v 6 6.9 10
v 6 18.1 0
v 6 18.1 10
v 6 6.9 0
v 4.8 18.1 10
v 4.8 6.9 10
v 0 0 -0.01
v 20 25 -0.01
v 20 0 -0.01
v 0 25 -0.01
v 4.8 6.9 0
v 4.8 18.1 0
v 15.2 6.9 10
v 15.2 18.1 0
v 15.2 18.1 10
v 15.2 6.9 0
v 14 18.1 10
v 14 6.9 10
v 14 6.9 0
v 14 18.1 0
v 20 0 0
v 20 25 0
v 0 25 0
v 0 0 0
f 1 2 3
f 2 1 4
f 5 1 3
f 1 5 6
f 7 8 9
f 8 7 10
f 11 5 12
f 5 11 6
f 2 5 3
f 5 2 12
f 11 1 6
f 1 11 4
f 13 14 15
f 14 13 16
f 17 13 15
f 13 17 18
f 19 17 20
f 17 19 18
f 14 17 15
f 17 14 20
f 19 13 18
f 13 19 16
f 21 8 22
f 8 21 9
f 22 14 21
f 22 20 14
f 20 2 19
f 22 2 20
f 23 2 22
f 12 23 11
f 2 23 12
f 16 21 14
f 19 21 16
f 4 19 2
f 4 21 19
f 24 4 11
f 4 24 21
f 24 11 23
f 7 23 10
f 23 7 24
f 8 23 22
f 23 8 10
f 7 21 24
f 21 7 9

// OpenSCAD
// file: ../Base/PlacementOptions.scad
// Fischertechnik Box Foundation
// Placement Options

// Alignment
NoAlign = 0;
AlignLeft = 1;
AlignBottom = 2;
AlignCenter = 3;
AlignRight = 4;
AlignTop = 5;

// Element rotation degree steps
rotations = [0, -90, -180, -270];

// Rotation
NoRotation = 0;
Rotate0 = 0;
Rotate90 = 1;
Rotate180 = 2;
Rotate270 = 3;

// Docking (seen from above)
NoDock = -1;
DockLeft = 0;
DockTop = 1;
DockRight = 2;
DockCorner = 2;
DockBottom = 3;

// Web corners
LowerLeft = 0;
UpperLeft = 1;
UpperRight = 2;
LowerRight = 3;

// Web position relative to corner
LeftOfCorner = 0;
RightOfCorner = 1;
// file: ../Base/Boxes.scad
// Fischertechnik Box Foundation
// Pre-designed Boxes

use <Constants.scad>

include <PlacementOptions.scad>

box190Width = 190;
box190Depth = 130;
box130Width = 130;
box130Depth = 95;
boxUsageHeight = 33.9;
boxWallThickness = 2.4;
boxBaseThickness = 1.0;

// getBoxWallThickness()
// Gets the wall thickness of a Fischertechnik Box

function getBoxWallThickness() = boxWallThickness;

// Gets the usable height of a fischertechnik box
function getBoxUsageHeight() = boxUsageHeight;

// Gets the thickness of the Fischertechnik box base.
function getBoxBaseThickness() = boxBaseThickness;

// Gets the usable inner space of a Box 190 as an x/y-list
function getBox190Space() = [
    box190Width - 2*getBoxWallThickness(), 
    box190Depth - 2*getBoxWallThickness() ];

// Imports the Fischertechnik empty box 130x190 mm and places it at position 0,0
// 190x130 are the outer sizes, the inner space is slightly smaller. Use getBox190Space() to get the inner sizes.
// This module needs the STL file "Fischertechnik Box 130x190.stl" in the library path.
// The box is positioned that the usable inner space is at the 0,0,0 position. The

module Box190() {
    translate([-getBoxWallThickness(),-getBoxWallThickness(),-getBoxBaseThickness()])
        import("Fischertechnik Box 130x190.stl", convexity=3);
}

// Gets the usable inner space of a Box 130 as an x/y-list
function getBox130Space() = [
    box130Width - 2*getBoxWallThickness(), 
    box130Depth - 2*getBoxWallThickness() ];

// Imports the Fischertechnik empty box 95x130 mm and places it at position 0,0
// 190x130 are the outer sizes, the inner space is slightly smaller. Use getBox190Space() to get the inner sizes.
// This module needs the STL file "Fischertechnik Box 95x130.stl" in the library path.
// The box is positioned that the usable inner space is at the 0,0,0 position. The

module Box130() {
    translate([-getBoxWallThickness(),-getBoxWallThickness(),-getBoxBaseThickness()])
        import("Fischertechnik Box 95x130.stl", convexity=3);
}

// Creates a web at the specified box walls
// corner 0 = LowerLeft, 1 = UpperLeft, 2 = UpperRight, 3 = LowerRight
// side 0 = LeftOfCorner, 1 = RightOfCorner
// distance = Distance in mm from the corner
// box = inner width and depth of the box (default: Box 190)
// webWidth = length of the web (default is 3 mms)
// webThickness = thickness of the web (default is 1 mm)

module BoxWeb(corner, side, distance, box=getBox190Space(), webWidth=3, webThickness=1.0) {
    sink = getBoxWallThickness()/2;

    width = (corner % 2 == 0) ? 
            (side == LeftOfCorner ? webWidth : webThickness) :
            (side == LeftOfCorner ? webThickness : webWidth);

    depth = (corner % 2 == 0) ? 
            (side == RightOfCorner ? webWidth : webThickness) :
            (side == RightOfCorner ? webThickness : webWidth);
    
    xDiff = corner == LowerLeft ? 
                (side == LeftOfCorner ? -sink : distance) :
            (corner == UpperLeft ?                
                (side == LeftOfCorner ? distance : -sink) :
            (corner == UpperRight ?
                (side == LeftOfCorner ? box.x-webWidth+sink : box.x-distance-webThickness) :
                (side == LeftOfCorner ? box.x-distance-webThickness: box.x-webWidth+sink)));

    yDiff = corner == LowerLeft ? 
                (side == RightOfCorner ? -sink : distance) :
            (corner == UpperLeft ?
                (side == RightOfCorner ? box.y-distance : box.y-webWidth+sink) :
            (corner == UpperRight ?
                (side == RightOfCorner ? box.y-webWidth+sink : box.y-distance) :
                (side == RightOfCorner ? distance : -sink)));
    
    translate([xDiff, yDiff, -getExcess()])
        cube([width, depth, boxUsageHeight + 2*getExcess()]);
}
// file: ../Base/Rotation.scad
// Fischertechnik Box Foundation
// Geometry Helpers Rotation

include <PlacementOptions.scad>

// getRotatedSpace(space, rotation=NoRotation)
// Rotates the space dependent on the specified rotation

function getRotatedSpace(space, rotation=NoRotation) = [
    (rotation == Rotate90 || rotation == Rotate270) ? space.y : space.x,
    (rotation == Rotate90 || rotation == Rotate270) ? space.x : space.y
];

// Rotates the given space around the fixed left lower corner
// space = the space the children needs as width/depth list [width,depth]
// rotation = 0 Rotate0 degrees, 1 Rotate90 degrees, 2 Rotate180 degrees, 3 Rotate270 degrees (equivalent to -90)

module RotateFix(space, rotation=Rotate0) {
    dy = (rotation == Rotate0 || rotation == Rotate270) ? 0 :
        (rotation == Rotate90) ? space.x :
        space.y;
    dx = (rotation < Rotate180) ? 0 :
        (rotation == Rotate180) ? space.x :
        space.y;
    
    translate([dx, dy, 0])
        rotate([0, 0, rotations[rotation]])
            children();
}
// file: ../Base/Alignment.scad
// Fischertechnik Box Foundation
// Geometry Helpers Alignment

include <PlacementOptions.scad>

// getAlignedX(elementWidth, spaceWidth, align=AlignRight, offset=0)
// Gets the aligned X offset of an element with the given
// width in the given space.
// elementWidth = The width of the element to positon
// spaceWidth = The space where the element should be aligned
// align = 0 AlignLeft, 1 AlignCenter, 2 AlignRight
// offset = an optional offset from the aligned position. When
// aligned left or centered, then positive values are in X direction.
// When aligned right then positive values are in negative X direction.

function getAlignedX(elementWidth, spaceWidth, align=AlignRight, offset=0) =
    (align == AlignLeft) ?
        offset :
        ((align == AlignCenter) ?
        (spaceWidth - elementWidth)/2 + offset :
        spaceWidth - offset - elementWidth);

// getAlignedY(elementDepth, spaceDepth, align=AlignTop, offset=0)
// Gets the aligned Y offset of an element with the given
// depth in the given space.
// elementDepth = The depth of the element to positon
// spaceDepth = The space where the element should be aligned
// align = 0 AlignBottom, 1 AlignCenter, 2 AlignTop
// offset = an optional offset from the aligned position. When
// aligned bottom or centered, then positive values are in Y direction.
// When aligned top then positive values are in negative Y direction.

function getAlignedY(elementDepth, spaceDepth, align=AlignTop, offset=0) =
    (align == AlignBottom) ?
        offset :
        ((align == AlignCenter) ?
        (spaceDepth - elementDepth)/2 + offset :
        spaceDepth - offset - elementDepth);
// file: ../Base/Placement.scad
// Fischertechnik Box Foundation
// Geometry Helpers Placement

use <Constants.scad>
use <Alignment.scad>
use <Rotation.scad>
use <Boxes.scad>

include <PlacementOptions.scad>

// Place(x=0, y=0, elementSpace=[0,0], alignX=AlignLeft, alignY=AlignBottom, rotation=Rotate0, boxSpace=getBox190Space())
// Places the child at the specified position
// y = Y-Position. This is a relative position when an X aligment is specified.
// x = X-Position. This is a relative position when an Y aligment is specified.
// elementSpace = space of the element to be placed [x,y]
// alignX = -1=NoAlign, 0 AlignLeft, 1 AlignCenter, 3 AlignRight (elementSpace and boxSpace required!)
// alignY = -1=NoAlign, 2 AlignBottom, 1 AlignCenter, 4 AlignTop (elementSpace and boxSpace required!)
// rotation = 0 Rotate0 0 degrees, 1 Rotate90 90 degrees, 
// 2 Rotate180 180 degrees, 3 Rotate270 270 degrees (equivalent to -90)
// boxSpace = Inner space of the box where the placement occurs [x,y] - default is Box 190x130 inner space

module Place(x=0, y=0, elementSpace=[0,0], 
  alignX=AlignLeft, alignY=AlignBottom, 
  rotation=NoRotation, boxSpace=getBox190Space()) {

    module Position(x, y, space, rotation=Rotate0) {
        translate([x, y, 0])
            RotateFix(space, rotation)
                children(0);
    }

    space = getRotatedSpace(elementSpace, rotation);
    alignedX = getAlignedX(space.x, boxSpace.x, alignX, x);
    alignedY = getAlignedY(space.y, boxSpace.y, alignY, y);
    Position(alignedX, alignedY, elementSpace, rotation)
        children(0);
}

// Center(space=getBox130Space(), elementSpace=[0,0])
// space = Space where the children is centered. For cylinder use centered=true and no elementSpace.
// elementSpace = space of the element to be centered [x,y]

module Center(space=getBox190Space(), elementSpace=[0,0]) {
    translate([(space.x - elementSpace.x) / 2, (space.y - elementSpace.y) / 2])
        children(0);
}

// CenterHorizontal(width=0, y=0, offset=0, space=getBox130Space())
// space = Space where the children is centered. For cylinder use centered=true and no elementSpace.
// elementSpace = space of the element to be centered [x,y]

module CenterHorizontal(width=0, y=0, offset=0, space=getBox190Space()) {
    translate([(space.x - width) / 2 + offset, y])
        children(0);
}

// CenterVertical(depth=0, x=0, offset=0, space=getBox130Space())
// space = Space where the children is centered. For cylinder use centered=true and no elementSpace.
// elementSpace = space of the element to be centered [x,y]

module CenterVerticalal(depth=0, x=0, offset=0, space=getBox190Space()) {
    translate([x, (space.y - depth) / 2 + offset])
        children(0);
}
// file: ../Base/Constants.scad
// Fischertechnik Box Foundation
// Constants

// Constant values necessary for multiple elements

// Base constants
dividerThickness = 1.2;
excess = 0.01;
fragments = 90;
tolerance = 0.8;

// Gets the thickness of a divider 
function getDividerThickness() = dividerThickness;

// Gets the excess that is used to merge walls into each other
function getExcess() = excess;

// Gets amount of fragments of a cylinder
function getFragments() = fragments;

// Gets the inner tolerance of a frame to each side
function getTolerance() = tolerance;


// Fischertechnik specific constants
axisDiameter = 4;
axisBottomDiameter = axisDiameter + 1;
standardEdgeDistance = 2.5;
standardWebDistance = 11.5;
standardCornerLength = 15;
tubeWallFactor = 1.6;

// Gets axis diameter
function getAxisDiameter() = axisDiameter;

// Gets axis bottom diameter for thicker part at the bottom
function getAxisBottomDiameter() = axisBottomDiameter;

// gets the standard distance to the wall of the box for dockable frames with webs
function getStandardEdgeDistance() = standardEdgeDistance;

// gets the standard distance of each web to the corner of the dockable frame
function getStandardWebDistance() = standardWebDistance;

// gets the standard length of the corner walls of a dockable frame
function getStandardCornerLength() = standardCornerLength;

// gets the wall thickness of a tube.
function getTubeWallThickness() = tubeWallFactor * getDividerThickness();
// main file
// Fischertechnik Box Library
// Holder for Winch Drum
// 31016

use <../Base/Constants.scad>
use <../Base/Placement.scad>
use <../ModelBase/Simple.scad>

width = 20;
depth = 25;
height = 10;

// getWinchDrumHolderSpace()
// Gets the space the winch drum holder needs as width and depth (.x and .y as a list)

function getHolderWinchDrumSpace() = [width, depth, height];

// HolderWinchDrum()
// Two walls for holding the 31016 winch drum.

module HolderWinchDrum() {
    holderDepth = 11.2;
    holderDistance = 8;
    
    Space(getHolderWinchDrumSpace());
    
    module Holders() {
        Wall([getDividerThickness(), holderDepth, height]);
        translate([holderDistance + getDividerThickness(), 0])
            Wall([getDividerThickness(), holderDepth, height]);
    }
    
    Center(getHolderWinchDrumSpace(), [holderDistance + 2*getDividerThickness(), holderDepth]) {
        Holders();
    }
}

// Tests
color("lightgray")
HolderWinchDrum();
